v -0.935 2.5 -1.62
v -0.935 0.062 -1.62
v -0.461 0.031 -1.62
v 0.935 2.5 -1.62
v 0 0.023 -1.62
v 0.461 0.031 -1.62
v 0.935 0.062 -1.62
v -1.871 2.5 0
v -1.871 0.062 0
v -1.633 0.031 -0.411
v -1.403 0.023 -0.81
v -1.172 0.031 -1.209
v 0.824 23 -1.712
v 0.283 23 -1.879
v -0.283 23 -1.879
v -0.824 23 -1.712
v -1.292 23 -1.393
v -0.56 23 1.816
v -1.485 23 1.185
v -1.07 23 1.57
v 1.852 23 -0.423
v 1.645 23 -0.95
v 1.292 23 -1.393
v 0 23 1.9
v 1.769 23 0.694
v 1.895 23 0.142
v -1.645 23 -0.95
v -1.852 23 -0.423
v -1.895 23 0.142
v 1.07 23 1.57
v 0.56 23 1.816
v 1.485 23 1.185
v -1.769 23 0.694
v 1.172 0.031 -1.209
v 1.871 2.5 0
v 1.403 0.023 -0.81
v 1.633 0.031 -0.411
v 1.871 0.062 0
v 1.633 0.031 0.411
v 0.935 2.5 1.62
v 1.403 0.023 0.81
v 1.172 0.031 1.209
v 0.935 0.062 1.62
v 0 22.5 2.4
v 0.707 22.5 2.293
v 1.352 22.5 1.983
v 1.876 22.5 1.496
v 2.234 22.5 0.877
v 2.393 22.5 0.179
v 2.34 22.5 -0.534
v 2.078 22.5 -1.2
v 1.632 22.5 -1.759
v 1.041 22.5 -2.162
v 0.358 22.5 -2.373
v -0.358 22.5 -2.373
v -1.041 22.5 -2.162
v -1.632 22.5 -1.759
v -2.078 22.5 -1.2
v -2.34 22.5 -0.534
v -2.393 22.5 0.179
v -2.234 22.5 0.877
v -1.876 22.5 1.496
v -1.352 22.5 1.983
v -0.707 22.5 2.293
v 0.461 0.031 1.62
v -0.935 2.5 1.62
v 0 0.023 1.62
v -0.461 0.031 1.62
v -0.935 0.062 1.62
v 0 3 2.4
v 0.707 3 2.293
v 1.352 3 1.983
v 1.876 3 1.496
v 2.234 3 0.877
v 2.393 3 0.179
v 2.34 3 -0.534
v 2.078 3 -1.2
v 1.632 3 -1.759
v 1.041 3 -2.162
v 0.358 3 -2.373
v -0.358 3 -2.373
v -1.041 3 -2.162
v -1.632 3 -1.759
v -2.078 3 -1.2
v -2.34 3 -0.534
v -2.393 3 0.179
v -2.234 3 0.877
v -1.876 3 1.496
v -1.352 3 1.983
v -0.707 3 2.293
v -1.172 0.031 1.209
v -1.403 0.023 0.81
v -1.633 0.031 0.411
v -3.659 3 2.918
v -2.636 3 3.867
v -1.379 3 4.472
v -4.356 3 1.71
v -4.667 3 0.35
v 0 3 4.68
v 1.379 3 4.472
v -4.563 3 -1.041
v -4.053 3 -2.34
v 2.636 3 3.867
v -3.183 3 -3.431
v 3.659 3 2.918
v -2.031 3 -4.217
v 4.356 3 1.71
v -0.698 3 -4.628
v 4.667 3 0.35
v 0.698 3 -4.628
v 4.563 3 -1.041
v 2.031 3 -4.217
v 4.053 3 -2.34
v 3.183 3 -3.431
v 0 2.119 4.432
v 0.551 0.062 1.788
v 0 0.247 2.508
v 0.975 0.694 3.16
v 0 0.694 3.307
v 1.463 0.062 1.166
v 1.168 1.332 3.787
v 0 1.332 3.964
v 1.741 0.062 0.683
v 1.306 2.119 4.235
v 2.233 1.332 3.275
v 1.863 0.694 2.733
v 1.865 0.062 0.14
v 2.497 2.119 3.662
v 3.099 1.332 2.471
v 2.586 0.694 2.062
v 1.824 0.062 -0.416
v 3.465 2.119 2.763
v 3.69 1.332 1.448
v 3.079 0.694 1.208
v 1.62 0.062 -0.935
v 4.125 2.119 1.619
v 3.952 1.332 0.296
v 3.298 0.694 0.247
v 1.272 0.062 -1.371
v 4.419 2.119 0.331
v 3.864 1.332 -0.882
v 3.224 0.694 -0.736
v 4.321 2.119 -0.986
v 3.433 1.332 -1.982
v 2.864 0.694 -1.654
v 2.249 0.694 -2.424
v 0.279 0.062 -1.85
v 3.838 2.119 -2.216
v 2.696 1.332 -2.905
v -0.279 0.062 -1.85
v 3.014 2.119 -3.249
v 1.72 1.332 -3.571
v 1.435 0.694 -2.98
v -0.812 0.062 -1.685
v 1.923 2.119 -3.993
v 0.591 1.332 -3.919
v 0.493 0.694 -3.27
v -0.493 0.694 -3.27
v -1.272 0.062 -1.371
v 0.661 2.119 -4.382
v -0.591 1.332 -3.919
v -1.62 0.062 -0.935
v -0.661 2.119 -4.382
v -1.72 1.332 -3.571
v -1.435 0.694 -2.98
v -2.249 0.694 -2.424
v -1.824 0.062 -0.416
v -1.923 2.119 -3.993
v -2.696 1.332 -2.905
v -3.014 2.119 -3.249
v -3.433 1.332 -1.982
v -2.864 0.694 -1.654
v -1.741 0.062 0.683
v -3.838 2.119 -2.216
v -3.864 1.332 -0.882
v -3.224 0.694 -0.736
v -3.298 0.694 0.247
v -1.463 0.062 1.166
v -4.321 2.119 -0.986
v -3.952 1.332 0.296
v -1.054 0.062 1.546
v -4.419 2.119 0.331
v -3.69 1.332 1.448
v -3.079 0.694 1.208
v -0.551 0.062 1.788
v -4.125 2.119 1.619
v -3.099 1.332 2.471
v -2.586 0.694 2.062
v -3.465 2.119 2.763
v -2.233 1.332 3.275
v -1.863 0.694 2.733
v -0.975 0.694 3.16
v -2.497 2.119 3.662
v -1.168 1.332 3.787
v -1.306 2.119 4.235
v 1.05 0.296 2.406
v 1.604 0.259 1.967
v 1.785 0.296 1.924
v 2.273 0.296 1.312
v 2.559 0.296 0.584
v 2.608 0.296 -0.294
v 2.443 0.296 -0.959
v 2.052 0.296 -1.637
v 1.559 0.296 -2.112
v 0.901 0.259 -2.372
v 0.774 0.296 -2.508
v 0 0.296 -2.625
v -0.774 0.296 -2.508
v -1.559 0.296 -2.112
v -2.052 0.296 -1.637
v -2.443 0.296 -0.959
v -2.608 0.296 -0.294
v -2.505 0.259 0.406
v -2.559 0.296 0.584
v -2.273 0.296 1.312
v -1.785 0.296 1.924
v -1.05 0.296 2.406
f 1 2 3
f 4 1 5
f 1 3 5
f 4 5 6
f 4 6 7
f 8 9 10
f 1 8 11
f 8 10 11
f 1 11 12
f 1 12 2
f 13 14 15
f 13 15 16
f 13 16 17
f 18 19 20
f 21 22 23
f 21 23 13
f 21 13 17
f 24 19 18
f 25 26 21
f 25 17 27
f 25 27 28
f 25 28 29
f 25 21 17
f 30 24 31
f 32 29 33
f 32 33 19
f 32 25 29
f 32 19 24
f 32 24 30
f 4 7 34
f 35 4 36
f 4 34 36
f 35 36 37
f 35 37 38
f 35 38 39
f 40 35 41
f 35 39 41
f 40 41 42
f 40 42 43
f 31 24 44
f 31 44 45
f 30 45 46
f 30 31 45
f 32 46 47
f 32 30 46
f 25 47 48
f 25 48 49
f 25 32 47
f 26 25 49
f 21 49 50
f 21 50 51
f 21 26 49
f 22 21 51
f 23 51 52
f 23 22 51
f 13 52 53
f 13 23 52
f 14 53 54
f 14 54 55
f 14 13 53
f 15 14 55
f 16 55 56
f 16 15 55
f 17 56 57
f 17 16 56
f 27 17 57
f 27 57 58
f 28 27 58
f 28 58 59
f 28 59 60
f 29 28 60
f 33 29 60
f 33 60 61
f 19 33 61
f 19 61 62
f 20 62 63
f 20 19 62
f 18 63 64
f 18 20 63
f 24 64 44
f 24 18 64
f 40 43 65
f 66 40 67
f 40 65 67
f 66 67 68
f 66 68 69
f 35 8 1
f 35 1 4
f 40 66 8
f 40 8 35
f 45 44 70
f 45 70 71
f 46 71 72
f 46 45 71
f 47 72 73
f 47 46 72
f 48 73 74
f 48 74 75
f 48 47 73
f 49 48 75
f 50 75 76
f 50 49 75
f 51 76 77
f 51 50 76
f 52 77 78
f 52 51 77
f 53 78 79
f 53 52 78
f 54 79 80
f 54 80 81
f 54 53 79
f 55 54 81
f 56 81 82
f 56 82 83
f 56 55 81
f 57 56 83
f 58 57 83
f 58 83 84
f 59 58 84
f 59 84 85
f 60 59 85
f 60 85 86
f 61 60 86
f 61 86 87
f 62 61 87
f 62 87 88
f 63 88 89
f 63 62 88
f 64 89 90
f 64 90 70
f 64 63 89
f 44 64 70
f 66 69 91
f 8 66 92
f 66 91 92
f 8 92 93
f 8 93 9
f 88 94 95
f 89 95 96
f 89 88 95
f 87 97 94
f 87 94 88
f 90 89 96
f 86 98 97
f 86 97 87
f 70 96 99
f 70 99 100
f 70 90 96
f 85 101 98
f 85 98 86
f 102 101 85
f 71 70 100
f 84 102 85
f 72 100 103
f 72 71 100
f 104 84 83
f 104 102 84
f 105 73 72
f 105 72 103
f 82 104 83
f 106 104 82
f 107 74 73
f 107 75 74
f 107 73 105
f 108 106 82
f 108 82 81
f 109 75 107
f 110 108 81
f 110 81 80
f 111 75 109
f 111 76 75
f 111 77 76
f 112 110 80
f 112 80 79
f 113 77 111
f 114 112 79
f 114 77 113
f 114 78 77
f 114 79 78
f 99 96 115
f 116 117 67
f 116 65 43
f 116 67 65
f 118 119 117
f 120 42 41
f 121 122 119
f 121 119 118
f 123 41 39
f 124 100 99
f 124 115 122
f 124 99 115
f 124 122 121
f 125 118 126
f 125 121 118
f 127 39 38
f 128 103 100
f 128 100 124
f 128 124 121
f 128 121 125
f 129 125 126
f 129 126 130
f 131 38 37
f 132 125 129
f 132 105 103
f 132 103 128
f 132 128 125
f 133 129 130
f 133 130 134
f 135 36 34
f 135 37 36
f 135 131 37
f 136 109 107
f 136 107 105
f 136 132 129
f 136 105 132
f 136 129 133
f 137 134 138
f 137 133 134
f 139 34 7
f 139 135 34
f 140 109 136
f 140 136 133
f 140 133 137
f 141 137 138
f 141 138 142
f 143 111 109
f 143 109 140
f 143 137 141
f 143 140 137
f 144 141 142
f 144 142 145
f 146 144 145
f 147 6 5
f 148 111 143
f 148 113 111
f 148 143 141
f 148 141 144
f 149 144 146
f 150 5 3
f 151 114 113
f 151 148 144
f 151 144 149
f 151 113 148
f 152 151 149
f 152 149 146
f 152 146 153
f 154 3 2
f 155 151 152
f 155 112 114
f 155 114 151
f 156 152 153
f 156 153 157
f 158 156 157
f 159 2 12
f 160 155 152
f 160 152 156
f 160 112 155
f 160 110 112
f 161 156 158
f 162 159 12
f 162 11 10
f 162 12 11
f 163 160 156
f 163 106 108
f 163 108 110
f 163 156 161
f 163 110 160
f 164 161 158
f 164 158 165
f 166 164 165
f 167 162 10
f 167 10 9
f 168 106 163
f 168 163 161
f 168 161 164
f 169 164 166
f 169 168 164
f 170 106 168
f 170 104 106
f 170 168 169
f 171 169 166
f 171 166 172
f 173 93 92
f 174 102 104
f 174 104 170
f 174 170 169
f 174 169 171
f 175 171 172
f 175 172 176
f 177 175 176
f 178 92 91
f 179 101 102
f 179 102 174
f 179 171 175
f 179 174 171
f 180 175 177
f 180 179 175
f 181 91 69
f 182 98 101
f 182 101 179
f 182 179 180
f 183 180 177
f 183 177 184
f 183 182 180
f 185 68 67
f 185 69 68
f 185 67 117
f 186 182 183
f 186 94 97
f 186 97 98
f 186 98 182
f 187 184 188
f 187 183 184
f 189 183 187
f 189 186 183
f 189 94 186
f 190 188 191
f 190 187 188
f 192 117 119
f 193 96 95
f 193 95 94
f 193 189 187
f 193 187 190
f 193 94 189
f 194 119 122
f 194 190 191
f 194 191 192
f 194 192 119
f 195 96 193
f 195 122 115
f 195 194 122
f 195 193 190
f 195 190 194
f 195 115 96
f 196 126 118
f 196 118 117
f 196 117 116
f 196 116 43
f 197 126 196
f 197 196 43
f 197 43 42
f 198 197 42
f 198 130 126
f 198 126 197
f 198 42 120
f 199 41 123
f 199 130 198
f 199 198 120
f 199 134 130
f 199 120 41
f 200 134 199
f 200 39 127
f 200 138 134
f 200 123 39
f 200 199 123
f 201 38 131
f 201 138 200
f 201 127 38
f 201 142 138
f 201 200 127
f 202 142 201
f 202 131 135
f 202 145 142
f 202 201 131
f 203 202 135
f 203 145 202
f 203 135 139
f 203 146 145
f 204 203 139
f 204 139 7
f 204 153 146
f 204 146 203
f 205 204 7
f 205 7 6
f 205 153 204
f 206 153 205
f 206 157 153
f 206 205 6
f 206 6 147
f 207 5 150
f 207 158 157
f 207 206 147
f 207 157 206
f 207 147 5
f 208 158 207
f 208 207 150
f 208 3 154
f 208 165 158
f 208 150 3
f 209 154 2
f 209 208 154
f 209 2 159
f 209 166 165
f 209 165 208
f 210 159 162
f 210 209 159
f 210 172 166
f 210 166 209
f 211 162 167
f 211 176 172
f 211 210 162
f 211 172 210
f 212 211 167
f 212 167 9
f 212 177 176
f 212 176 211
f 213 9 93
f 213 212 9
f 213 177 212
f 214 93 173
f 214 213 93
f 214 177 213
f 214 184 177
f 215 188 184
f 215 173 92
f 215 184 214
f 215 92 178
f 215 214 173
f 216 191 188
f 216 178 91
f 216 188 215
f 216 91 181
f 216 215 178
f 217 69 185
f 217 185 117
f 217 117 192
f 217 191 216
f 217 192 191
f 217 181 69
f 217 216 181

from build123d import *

# Parameters (mm, degrees)
SKETCH1_R           = 4.68
BOSS_EXTRUDE1_DEPTH = 23
SKETCH2_OUTSIDE_W   = 16.668
SKETCH2_OUTSIDE_H   = 16.668
SKETCH2_OUTSIDE_R   = 2.4
CUT_EXTRUDE1_DEPTH  = 20
CHAMFER1_SIZE       = 0.5
CUT_EXTRUDE2_DEPTH  = 2.5
FILLET1_R           = 3.5


with BuildPart() as part:
    # Sketch1 → Boss-Extrude1 (new body)
    with BuildSketch(Plane(origin=(0, 0, 0), x_dir=(1, 0, 0), z_dir=(0, 1, 0))):
        with Locations(Location((0, 0, 0), (0, 0, 270))):
            Circle(SKETCH1_R)
    extrude(amount=BOSS_EXTRUDE1_DEPTH)

    # Sketch2 outside → Cut-Extrude1 (cut)
    with BuildSketch(Plane(origin=(0, 23, 0), x_dir=(1, 0, 0), z_dir=(0, 1, 0))):
        Rectangle(SKETCH2_OUTSIDE_W, SKETCH2_OUTSIDE_H)
        with Locations(Location((0, 0, 0), (0, 0, 270))):
            Circle(SKETCH2_OUTSIDE_R, mode=Mode.SUBTRACT)
    extrude(amount=-CUT_EXTRUDE1_DEPTH, mode=Mode.SUBTRACT)

    # Chamfer1
    chamfer1_edges = [part.edges().sort_by_distance(p)[0] for p in [
        (0, 23, -2.4),
    ]]
    chamfer(chamfer1_edges, length=CHAMFER1_SIZE)

    # Sketch8 → Cut-Extrude2 (cut)
    with BuildSketch(Plane.XZ):
        Polygon((1.870614872, 0), (0.935307436, 1.62), (-0.935307436, 1.62), (-1.870614872, 0), (-0.935307436, -1.62), (0.935307436, -1.62), align=None)
    extrude(amount=-CUT_EXTRUDE2_DEPTH, mode=Mode.SUBTRACT)

    # Fillet1
    # the kernel refuses this fillet: 3.5 mm, written as the material it takes off along each edge
    with BuildSketch(Plane(origin=(0, 0, 0), x_dir=(0, 0, 1), z_dir=(-1, 0, 0))) as fillet1_piece_1:
        with BuildLine():
            CenterArc((1.215898385, 3.5), FILLET1_R, 270, 81.786789298)
            Line((1.215898385, 0), (1.215898385, -0.07))
            Line((1.215898385, -0.07), (4.68, -0.07))
            Line((4.68, -0.07), (4.75, 0))
            ThreePointArc((4.75, 0), (4.75, 1.5), (4.749282032, 2.99))
            Line((4.749282032, 2.99), (4.68, 3))
        make_face()
    revolve(axis=Axis((0, 0, 0), (0, 1, 0)), mode=Mode.SUBTRACT)


solid = part.part
